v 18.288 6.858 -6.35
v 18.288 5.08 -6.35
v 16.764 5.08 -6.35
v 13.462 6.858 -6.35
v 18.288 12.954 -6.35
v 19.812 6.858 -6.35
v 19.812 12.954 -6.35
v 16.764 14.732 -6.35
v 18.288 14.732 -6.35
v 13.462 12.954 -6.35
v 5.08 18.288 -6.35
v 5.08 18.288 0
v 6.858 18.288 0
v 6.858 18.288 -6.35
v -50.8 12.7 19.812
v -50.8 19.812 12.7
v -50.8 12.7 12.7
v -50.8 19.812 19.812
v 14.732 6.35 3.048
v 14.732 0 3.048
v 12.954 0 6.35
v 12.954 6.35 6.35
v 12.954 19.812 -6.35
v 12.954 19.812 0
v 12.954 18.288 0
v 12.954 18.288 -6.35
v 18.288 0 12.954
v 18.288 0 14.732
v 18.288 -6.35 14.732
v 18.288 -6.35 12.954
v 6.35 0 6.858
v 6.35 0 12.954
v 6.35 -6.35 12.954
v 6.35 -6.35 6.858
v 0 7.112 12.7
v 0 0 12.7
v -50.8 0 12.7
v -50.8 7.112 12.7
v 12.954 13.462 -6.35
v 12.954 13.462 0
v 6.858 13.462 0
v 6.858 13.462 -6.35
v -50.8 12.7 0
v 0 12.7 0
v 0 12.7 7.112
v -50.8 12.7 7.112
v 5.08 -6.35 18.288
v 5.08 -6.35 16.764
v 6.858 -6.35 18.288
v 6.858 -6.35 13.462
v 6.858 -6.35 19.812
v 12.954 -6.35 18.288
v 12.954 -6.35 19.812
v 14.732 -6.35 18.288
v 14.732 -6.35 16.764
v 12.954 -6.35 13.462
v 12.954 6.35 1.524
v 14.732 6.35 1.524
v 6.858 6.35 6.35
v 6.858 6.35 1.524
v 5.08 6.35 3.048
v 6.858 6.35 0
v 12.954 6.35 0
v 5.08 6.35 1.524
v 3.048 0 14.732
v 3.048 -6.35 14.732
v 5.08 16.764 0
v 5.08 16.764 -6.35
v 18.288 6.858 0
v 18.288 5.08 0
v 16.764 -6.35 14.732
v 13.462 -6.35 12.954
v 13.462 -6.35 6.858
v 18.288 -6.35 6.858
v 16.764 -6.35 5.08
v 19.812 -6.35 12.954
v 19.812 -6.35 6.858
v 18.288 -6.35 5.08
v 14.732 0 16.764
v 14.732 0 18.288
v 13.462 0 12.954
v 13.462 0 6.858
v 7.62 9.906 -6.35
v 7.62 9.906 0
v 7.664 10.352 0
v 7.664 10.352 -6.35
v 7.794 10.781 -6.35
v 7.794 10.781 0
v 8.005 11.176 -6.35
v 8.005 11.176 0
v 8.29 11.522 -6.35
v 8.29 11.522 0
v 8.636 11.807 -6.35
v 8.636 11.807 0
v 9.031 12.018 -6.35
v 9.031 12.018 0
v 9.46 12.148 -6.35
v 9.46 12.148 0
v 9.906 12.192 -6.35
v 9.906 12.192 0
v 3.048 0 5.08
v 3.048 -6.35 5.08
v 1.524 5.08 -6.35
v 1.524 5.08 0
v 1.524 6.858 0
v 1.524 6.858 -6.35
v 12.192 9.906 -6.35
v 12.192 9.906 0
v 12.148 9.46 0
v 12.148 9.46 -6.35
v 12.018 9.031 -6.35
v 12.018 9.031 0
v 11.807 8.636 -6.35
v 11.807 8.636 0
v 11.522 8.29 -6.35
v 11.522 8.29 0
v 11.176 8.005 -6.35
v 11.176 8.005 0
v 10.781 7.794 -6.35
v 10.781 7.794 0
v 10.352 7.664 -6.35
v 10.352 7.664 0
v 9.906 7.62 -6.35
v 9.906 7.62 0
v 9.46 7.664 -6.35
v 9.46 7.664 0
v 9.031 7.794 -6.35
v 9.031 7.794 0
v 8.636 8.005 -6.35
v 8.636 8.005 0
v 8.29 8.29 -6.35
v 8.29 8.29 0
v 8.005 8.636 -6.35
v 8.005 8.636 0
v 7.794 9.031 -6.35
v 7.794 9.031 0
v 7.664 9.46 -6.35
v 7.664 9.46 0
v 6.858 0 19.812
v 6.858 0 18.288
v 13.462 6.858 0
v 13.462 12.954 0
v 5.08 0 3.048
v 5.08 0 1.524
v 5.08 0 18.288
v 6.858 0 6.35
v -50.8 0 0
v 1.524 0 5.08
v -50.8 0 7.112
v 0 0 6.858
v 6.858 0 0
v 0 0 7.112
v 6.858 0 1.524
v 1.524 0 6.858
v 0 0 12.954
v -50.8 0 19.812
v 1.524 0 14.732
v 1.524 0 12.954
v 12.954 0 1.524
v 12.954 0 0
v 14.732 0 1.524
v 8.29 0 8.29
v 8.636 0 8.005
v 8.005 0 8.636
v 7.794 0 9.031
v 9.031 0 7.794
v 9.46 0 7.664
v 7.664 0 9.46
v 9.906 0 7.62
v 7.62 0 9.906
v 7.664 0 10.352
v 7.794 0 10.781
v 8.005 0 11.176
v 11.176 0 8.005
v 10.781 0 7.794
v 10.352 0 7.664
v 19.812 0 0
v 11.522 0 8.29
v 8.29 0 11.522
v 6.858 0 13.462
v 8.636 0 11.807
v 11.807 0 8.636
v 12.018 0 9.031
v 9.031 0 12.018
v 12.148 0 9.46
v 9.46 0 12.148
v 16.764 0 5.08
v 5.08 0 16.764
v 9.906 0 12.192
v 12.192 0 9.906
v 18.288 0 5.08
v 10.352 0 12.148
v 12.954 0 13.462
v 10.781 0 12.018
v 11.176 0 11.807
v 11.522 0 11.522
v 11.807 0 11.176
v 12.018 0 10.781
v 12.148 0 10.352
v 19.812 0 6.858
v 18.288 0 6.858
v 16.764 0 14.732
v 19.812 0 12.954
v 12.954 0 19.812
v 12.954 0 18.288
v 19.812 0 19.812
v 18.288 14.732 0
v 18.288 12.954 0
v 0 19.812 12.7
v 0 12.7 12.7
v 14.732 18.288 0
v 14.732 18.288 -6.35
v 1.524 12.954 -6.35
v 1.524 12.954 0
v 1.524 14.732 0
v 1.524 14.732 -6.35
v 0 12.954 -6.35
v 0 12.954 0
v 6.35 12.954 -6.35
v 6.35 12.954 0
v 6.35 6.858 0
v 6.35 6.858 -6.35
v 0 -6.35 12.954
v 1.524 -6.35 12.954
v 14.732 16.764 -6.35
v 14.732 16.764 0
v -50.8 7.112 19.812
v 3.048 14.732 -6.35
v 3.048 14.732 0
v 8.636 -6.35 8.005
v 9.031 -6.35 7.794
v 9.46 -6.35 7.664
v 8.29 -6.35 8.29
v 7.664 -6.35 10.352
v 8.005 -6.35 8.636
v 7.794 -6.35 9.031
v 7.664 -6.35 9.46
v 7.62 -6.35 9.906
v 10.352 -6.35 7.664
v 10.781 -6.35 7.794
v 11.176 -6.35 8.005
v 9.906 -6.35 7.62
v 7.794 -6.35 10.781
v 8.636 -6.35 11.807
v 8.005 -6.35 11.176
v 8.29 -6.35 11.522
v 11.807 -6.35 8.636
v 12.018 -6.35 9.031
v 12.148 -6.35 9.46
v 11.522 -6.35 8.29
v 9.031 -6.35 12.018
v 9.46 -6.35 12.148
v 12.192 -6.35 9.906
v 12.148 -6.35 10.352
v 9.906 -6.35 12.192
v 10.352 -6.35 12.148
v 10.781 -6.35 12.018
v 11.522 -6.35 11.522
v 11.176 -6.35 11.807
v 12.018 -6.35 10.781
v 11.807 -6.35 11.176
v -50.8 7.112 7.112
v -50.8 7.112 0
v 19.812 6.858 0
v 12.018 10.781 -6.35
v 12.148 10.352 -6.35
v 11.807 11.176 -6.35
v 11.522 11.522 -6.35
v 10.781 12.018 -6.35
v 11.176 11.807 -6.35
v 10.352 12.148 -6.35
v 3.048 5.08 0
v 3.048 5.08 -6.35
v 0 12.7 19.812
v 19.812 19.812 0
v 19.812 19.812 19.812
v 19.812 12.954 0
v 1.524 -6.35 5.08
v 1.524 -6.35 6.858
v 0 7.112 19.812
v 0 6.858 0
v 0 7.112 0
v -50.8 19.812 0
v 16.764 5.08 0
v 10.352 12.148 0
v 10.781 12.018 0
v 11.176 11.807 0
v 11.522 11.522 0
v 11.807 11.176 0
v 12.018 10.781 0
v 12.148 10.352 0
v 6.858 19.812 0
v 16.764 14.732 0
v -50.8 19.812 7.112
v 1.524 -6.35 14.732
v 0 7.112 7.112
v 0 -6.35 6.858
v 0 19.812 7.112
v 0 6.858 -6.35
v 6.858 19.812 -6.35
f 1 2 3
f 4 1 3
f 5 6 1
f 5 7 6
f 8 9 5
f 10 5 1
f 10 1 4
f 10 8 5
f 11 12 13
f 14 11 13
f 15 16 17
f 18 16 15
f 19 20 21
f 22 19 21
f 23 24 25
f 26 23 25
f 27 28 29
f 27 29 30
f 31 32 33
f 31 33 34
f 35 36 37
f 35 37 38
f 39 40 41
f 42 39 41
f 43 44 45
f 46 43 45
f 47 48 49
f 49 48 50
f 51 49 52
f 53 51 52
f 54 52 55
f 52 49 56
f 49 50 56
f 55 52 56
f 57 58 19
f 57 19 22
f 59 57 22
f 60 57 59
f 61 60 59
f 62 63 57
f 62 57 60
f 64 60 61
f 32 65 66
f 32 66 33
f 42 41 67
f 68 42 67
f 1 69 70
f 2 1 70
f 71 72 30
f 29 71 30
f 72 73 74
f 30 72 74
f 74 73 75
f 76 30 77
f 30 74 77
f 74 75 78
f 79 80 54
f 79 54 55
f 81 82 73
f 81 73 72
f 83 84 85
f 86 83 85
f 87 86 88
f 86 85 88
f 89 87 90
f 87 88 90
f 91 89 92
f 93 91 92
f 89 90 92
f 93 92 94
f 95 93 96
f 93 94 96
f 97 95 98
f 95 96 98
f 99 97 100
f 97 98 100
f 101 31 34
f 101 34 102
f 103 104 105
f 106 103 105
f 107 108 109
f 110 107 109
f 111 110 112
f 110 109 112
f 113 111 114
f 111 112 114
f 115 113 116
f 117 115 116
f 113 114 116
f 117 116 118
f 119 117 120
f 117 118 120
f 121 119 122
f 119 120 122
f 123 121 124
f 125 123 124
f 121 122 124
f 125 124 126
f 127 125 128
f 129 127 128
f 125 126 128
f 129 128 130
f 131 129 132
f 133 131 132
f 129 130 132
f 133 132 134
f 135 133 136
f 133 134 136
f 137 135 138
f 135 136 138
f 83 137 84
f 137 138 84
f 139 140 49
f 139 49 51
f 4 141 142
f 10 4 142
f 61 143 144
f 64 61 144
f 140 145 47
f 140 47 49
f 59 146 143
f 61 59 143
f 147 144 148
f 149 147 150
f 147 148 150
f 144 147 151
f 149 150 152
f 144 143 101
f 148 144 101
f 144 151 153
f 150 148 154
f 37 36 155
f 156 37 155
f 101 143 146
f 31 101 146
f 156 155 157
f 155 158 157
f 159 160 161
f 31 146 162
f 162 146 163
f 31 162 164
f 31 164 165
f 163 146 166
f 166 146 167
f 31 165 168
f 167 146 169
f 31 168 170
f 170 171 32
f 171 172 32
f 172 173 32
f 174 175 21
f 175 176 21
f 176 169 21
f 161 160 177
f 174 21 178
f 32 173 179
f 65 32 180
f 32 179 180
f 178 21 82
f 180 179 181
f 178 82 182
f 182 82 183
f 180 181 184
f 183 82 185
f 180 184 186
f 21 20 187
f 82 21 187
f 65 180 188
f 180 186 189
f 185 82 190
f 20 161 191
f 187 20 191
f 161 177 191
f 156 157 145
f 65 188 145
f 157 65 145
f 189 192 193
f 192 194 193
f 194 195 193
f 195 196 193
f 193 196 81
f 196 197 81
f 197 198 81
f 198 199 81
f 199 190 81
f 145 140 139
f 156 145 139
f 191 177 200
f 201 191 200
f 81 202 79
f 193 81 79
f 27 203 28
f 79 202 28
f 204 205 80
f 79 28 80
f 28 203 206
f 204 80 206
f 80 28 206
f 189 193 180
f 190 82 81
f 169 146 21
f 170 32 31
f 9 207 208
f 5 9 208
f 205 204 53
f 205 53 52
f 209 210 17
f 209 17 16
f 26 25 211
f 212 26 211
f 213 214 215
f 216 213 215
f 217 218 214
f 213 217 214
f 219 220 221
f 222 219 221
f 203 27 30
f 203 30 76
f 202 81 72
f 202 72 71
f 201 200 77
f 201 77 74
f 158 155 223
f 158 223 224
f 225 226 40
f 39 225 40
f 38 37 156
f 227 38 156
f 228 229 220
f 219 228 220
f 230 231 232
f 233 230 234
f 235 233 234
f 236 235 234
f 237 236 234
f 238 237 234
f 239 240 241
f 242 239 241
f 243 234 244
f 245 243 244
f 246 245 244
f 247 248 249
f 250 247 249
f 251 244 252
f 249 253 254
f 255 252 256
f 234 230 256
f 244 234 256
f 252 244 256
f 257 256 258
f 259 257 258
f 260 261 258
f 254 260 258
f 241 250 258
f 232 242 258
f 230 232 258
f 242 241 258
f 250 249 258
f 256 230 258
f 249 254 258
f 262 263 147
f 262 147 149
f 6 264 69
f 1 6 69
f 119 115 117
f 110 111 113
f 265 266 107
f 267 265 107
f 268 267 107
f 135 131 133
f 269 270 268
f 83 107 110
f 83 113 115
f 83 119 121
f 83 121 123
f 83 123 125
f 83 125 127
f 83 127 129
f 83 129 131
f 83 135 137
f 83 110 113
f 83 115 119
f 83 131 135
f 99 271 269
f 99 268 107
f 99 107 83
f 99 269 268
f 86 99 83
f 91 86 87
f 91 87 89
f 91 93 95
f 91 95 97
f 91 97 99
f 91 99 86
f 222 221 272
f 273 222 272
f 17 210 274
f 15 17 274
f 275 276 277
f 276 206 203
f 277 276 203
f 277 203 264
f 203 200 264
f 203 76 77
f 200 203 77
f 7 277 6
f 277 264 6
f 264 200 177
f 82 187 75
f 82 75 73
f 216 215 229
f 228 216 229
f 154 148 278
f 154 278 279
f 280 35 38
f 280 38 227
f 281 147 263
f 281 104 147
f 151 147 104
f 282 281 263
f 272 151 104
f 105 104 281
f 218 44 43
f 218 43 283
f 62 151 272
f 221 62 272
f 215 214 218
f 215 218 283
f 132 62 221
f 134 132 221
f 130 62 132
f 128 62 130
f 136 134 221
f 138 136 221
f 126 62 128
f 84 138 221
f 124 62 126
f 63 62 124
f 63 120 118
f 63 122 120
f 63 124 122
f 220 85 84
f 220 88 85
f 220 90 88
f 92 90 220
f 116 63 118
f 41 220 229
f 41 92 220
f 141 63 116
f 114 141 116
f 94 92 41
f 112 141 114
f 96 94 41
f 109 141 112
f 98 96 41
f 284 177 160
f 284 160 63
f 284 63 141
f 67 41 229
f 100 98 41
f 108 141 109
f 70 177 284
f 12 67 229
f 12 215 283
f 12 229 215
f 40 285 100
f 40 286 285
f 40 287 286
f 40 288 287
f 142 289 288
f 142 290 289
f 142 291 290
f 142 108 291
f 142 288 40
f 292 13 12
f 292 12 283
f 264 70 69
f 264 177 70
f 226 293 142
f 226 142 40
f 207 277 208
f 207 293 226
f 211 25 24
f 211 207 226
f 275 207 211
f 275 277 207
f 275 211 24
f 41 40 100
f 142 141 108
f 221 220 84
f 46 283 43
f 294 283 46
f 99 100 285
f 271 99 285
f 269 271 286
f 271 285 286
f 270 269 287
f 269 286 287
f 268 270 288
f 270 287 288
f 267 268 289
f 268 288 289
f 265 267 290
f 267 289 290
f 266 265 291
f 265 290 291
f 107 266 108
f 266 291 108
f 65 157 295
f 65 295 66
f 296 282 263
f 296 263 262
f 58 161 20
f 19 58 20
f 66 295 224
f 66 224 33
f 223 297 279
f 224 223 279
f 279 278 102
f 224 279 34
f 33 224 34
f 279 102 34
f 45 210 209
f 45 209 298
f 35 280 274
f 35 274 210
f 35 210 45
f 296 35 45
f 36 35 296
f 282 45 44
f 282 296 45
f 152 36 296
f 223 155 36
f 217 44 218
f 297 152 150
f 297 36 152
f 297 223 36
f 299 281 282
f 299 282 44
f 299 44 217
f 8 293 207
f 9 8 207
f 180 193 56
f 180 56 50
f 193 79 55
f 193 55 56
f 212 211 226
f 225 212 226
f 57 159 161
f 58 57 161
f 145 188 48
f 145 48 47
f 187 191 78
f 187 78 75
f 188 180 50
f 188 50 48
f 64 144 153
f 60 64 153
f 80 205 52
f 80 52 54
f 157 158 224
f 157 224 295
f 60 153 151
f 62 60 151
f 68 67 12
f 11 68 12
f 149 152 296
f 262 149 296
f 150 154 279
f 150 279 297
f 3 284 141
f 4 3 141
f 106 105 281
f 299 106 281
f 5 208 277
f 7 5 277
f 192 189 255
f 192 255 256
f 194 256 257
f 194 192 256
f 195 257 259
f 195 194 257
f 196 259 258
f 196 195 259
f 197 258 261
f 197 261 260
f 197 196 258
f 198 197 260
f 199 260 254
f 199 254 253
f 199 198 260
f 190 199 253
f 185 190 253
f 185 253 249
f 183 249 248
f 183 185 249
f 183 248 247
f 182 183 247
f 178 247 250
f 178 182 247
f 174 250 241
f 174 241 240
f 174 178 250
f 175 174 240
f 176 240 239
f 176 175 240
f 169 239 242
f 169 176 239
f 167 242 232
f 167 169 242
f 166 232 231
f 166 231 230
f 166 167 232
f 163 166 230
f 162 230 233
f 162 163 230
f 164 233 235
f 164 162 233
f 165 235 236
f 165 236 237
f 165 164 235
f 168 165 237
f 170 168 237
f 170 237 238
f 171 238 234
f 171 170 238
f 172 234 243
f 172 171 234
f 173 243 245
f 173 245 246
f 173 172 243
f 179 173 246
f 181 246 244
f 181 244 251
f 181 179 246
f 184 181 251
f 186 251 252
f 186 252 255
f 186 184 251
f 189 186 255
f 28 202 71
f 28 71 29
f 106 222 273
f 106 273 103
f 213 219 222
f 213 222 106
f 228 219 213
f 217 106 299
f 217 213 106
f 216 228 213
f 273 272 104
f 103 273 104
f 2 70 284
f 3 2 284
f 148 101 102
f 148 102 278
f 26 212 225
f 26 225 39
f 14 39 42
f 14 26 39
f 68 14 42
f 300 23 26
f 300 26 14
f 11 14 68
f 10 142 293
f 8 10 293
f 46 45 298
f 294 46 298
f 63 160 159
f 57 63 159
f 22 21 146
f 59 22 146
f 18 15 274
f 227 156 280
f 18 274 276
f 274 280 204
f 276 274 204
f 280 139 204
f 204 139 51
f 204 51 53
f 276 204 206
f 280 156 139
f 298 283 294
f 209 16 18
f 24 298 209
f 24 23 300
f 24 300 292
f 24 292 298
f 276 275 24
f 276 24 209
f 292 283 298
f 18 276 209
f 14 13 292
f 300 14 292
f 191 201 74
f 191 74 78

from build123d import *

# Parameters (mm, degrees)
SKETCH1_W           = 19.812
SKETCH1_H           = 19.812
BOSS_EXTRUDE1_DEPTH = 19.812
SKETCH1_3_R         = 2.286
BOSS_EXTRUDE2_DEPTH = 6.35
CUT_EXTRUDE1_DEPTH  = 6.35
SKETCH3_R           = 2.286
BOSS_EXTRUDE3_DEPTH = 6.35
SKETCH4_W           = 7.112
SKETCH4_H           = 7.112
BOSS_EXTRUDE4_DEPTH = 50.8


with BuildPart() as part:
    # Sketch1 → Boss-Extrude1 (new body)
    with BuildSketch(Plane(origin=(0, 0, 0), x_dir=(1, 0, 0), z_dir=(0, 1, 0))):
        with Locations((9.906, -9.906)):
            Rectangle(SKETCH1_W, SKETCH1_H)
    extrude(amount=BOSS_EXTRUDE1_DEPTH)

    # Sketch1<3> → Boss-Extrude2 (add)
    with BuildSketch(Plane(origin=(0, 0, 0), x_dir=(1, 0, 0), z_dir=(0, 1, 0))):
        with Locations((9.906, -9.906)):
            Circle(SKETCH1_3_R)
        Polygon((1.524, -6.858), (0, -6.858), (0, -12.954), (1.524, -12.954), (1.524, -14.732), (3.048, -14.732), (6.35, -12.954), (6.35, -6.858), (3.048, -5.08), (1.524, -5.08), align=None)
        Polygon((19.812, -12.954), (19.812, -6.858), (18.288, -6.858), (18.288, -5.08), (16.764, -5.08), (13.462, -6.858), (13.462, -12.954), (16.764, -14.732), (18.288, -14.732), (18.288, -12.954), align=None)
        Polygon((6.858, -18.288), (6.858, -19.812), (12.954, -19.812), (12.954, -18.288), (14.732, -18.288), (14.732, -16.764), (12.954, -13.462), (6.858, -13.462), (5.08, -16.764), (5.08, -18.288), align=None)
    extrude(amount=-BOSS_EXTRUDE2_DEPTH)

    # Sketch1<5> → Cut-Extrude1 (cut)
    with BuildSketch(Plane(origin=(0, 0, 0), x_dir=(1, 0, 0), z_dir=(0, 1, 0))):
        Polygon((12.954, 0), (6.858, 0), (6.858, -1.524), (5.08, -1.524), (5.08, -3.048), (6.858, -6.35), (9.906, -6.35), (12.954, -6.35), (14.732, -3.048), (14.732, -1.524), (12.954, -1.524), align=None)
    extrude(amount=CUT_EXTRUDE1_DEPTH, mode=Mode.SUBTRACT)

    # Sketch3 → Boss-Extrude3 (add)
    with BuildSketch(Plane(origin=(0, 0, 0), x_dir=(-1, 0, 0), z_dir=(0, 0, -1))):
        Polygon((-19.812, 12.954), (-19.812, 6.858), (-18.288, 6.858), (-18.288, 5.08), (-16.764, 5.08), (-13.462, 6.858), (-13.462, 12.954), (-16.764, 14.732), (-18.288, 14.732), (-18.288, 12.954), align=None)
        with Locations((-9.906, 9.906)):
            Circle(SKETCH3_R)
        Polygon((-6.858, 19.812), (-12.954, 19.812), (-12.954, 18.288), (-14.732, 18.288), (-14.732, 16.764), (-12.954, 13.462), (-6.858, 13.462), (-5.08, 16.764), (-5.08, 18.288), (-6.858, 18.288), align=None)
        Polygon((-6.35, 12.954), (-6.35, 6.858), (-3.048, 5.08), (-1.524, 5.08), (-1.524, 6.858), (0, 6.858), (0, 12.954), (-1.524, 12.954), (-1.524, 14.732), (-3.048, 14.732), align=None)
    extrude(amount=BOSS_EXTRUDE3_DEPTH)

    # Sketch4 → Boss-Extrude4 (add)
    with BuildSketch(Plane.ZY):
        with Locations((16.256, 3.556)):
            Rectangle(SKETCH4_W, SKETCH4_H)
        with Locations((3.556, 16.256)):
            Rectangle(SKETCH4_W, SKETCH4_H)
        with Locations((16.256, 16.256)):
            Rectangle(SKETCH4_W, SKETCH4_H)
        with Locations((3.556, 3.556)):
            Rectangle(SKETCH4_W, SKETCH4_H)
    extrude(amount=BOSS_EXTRUDE4_DEPTH)


solid = part.part
